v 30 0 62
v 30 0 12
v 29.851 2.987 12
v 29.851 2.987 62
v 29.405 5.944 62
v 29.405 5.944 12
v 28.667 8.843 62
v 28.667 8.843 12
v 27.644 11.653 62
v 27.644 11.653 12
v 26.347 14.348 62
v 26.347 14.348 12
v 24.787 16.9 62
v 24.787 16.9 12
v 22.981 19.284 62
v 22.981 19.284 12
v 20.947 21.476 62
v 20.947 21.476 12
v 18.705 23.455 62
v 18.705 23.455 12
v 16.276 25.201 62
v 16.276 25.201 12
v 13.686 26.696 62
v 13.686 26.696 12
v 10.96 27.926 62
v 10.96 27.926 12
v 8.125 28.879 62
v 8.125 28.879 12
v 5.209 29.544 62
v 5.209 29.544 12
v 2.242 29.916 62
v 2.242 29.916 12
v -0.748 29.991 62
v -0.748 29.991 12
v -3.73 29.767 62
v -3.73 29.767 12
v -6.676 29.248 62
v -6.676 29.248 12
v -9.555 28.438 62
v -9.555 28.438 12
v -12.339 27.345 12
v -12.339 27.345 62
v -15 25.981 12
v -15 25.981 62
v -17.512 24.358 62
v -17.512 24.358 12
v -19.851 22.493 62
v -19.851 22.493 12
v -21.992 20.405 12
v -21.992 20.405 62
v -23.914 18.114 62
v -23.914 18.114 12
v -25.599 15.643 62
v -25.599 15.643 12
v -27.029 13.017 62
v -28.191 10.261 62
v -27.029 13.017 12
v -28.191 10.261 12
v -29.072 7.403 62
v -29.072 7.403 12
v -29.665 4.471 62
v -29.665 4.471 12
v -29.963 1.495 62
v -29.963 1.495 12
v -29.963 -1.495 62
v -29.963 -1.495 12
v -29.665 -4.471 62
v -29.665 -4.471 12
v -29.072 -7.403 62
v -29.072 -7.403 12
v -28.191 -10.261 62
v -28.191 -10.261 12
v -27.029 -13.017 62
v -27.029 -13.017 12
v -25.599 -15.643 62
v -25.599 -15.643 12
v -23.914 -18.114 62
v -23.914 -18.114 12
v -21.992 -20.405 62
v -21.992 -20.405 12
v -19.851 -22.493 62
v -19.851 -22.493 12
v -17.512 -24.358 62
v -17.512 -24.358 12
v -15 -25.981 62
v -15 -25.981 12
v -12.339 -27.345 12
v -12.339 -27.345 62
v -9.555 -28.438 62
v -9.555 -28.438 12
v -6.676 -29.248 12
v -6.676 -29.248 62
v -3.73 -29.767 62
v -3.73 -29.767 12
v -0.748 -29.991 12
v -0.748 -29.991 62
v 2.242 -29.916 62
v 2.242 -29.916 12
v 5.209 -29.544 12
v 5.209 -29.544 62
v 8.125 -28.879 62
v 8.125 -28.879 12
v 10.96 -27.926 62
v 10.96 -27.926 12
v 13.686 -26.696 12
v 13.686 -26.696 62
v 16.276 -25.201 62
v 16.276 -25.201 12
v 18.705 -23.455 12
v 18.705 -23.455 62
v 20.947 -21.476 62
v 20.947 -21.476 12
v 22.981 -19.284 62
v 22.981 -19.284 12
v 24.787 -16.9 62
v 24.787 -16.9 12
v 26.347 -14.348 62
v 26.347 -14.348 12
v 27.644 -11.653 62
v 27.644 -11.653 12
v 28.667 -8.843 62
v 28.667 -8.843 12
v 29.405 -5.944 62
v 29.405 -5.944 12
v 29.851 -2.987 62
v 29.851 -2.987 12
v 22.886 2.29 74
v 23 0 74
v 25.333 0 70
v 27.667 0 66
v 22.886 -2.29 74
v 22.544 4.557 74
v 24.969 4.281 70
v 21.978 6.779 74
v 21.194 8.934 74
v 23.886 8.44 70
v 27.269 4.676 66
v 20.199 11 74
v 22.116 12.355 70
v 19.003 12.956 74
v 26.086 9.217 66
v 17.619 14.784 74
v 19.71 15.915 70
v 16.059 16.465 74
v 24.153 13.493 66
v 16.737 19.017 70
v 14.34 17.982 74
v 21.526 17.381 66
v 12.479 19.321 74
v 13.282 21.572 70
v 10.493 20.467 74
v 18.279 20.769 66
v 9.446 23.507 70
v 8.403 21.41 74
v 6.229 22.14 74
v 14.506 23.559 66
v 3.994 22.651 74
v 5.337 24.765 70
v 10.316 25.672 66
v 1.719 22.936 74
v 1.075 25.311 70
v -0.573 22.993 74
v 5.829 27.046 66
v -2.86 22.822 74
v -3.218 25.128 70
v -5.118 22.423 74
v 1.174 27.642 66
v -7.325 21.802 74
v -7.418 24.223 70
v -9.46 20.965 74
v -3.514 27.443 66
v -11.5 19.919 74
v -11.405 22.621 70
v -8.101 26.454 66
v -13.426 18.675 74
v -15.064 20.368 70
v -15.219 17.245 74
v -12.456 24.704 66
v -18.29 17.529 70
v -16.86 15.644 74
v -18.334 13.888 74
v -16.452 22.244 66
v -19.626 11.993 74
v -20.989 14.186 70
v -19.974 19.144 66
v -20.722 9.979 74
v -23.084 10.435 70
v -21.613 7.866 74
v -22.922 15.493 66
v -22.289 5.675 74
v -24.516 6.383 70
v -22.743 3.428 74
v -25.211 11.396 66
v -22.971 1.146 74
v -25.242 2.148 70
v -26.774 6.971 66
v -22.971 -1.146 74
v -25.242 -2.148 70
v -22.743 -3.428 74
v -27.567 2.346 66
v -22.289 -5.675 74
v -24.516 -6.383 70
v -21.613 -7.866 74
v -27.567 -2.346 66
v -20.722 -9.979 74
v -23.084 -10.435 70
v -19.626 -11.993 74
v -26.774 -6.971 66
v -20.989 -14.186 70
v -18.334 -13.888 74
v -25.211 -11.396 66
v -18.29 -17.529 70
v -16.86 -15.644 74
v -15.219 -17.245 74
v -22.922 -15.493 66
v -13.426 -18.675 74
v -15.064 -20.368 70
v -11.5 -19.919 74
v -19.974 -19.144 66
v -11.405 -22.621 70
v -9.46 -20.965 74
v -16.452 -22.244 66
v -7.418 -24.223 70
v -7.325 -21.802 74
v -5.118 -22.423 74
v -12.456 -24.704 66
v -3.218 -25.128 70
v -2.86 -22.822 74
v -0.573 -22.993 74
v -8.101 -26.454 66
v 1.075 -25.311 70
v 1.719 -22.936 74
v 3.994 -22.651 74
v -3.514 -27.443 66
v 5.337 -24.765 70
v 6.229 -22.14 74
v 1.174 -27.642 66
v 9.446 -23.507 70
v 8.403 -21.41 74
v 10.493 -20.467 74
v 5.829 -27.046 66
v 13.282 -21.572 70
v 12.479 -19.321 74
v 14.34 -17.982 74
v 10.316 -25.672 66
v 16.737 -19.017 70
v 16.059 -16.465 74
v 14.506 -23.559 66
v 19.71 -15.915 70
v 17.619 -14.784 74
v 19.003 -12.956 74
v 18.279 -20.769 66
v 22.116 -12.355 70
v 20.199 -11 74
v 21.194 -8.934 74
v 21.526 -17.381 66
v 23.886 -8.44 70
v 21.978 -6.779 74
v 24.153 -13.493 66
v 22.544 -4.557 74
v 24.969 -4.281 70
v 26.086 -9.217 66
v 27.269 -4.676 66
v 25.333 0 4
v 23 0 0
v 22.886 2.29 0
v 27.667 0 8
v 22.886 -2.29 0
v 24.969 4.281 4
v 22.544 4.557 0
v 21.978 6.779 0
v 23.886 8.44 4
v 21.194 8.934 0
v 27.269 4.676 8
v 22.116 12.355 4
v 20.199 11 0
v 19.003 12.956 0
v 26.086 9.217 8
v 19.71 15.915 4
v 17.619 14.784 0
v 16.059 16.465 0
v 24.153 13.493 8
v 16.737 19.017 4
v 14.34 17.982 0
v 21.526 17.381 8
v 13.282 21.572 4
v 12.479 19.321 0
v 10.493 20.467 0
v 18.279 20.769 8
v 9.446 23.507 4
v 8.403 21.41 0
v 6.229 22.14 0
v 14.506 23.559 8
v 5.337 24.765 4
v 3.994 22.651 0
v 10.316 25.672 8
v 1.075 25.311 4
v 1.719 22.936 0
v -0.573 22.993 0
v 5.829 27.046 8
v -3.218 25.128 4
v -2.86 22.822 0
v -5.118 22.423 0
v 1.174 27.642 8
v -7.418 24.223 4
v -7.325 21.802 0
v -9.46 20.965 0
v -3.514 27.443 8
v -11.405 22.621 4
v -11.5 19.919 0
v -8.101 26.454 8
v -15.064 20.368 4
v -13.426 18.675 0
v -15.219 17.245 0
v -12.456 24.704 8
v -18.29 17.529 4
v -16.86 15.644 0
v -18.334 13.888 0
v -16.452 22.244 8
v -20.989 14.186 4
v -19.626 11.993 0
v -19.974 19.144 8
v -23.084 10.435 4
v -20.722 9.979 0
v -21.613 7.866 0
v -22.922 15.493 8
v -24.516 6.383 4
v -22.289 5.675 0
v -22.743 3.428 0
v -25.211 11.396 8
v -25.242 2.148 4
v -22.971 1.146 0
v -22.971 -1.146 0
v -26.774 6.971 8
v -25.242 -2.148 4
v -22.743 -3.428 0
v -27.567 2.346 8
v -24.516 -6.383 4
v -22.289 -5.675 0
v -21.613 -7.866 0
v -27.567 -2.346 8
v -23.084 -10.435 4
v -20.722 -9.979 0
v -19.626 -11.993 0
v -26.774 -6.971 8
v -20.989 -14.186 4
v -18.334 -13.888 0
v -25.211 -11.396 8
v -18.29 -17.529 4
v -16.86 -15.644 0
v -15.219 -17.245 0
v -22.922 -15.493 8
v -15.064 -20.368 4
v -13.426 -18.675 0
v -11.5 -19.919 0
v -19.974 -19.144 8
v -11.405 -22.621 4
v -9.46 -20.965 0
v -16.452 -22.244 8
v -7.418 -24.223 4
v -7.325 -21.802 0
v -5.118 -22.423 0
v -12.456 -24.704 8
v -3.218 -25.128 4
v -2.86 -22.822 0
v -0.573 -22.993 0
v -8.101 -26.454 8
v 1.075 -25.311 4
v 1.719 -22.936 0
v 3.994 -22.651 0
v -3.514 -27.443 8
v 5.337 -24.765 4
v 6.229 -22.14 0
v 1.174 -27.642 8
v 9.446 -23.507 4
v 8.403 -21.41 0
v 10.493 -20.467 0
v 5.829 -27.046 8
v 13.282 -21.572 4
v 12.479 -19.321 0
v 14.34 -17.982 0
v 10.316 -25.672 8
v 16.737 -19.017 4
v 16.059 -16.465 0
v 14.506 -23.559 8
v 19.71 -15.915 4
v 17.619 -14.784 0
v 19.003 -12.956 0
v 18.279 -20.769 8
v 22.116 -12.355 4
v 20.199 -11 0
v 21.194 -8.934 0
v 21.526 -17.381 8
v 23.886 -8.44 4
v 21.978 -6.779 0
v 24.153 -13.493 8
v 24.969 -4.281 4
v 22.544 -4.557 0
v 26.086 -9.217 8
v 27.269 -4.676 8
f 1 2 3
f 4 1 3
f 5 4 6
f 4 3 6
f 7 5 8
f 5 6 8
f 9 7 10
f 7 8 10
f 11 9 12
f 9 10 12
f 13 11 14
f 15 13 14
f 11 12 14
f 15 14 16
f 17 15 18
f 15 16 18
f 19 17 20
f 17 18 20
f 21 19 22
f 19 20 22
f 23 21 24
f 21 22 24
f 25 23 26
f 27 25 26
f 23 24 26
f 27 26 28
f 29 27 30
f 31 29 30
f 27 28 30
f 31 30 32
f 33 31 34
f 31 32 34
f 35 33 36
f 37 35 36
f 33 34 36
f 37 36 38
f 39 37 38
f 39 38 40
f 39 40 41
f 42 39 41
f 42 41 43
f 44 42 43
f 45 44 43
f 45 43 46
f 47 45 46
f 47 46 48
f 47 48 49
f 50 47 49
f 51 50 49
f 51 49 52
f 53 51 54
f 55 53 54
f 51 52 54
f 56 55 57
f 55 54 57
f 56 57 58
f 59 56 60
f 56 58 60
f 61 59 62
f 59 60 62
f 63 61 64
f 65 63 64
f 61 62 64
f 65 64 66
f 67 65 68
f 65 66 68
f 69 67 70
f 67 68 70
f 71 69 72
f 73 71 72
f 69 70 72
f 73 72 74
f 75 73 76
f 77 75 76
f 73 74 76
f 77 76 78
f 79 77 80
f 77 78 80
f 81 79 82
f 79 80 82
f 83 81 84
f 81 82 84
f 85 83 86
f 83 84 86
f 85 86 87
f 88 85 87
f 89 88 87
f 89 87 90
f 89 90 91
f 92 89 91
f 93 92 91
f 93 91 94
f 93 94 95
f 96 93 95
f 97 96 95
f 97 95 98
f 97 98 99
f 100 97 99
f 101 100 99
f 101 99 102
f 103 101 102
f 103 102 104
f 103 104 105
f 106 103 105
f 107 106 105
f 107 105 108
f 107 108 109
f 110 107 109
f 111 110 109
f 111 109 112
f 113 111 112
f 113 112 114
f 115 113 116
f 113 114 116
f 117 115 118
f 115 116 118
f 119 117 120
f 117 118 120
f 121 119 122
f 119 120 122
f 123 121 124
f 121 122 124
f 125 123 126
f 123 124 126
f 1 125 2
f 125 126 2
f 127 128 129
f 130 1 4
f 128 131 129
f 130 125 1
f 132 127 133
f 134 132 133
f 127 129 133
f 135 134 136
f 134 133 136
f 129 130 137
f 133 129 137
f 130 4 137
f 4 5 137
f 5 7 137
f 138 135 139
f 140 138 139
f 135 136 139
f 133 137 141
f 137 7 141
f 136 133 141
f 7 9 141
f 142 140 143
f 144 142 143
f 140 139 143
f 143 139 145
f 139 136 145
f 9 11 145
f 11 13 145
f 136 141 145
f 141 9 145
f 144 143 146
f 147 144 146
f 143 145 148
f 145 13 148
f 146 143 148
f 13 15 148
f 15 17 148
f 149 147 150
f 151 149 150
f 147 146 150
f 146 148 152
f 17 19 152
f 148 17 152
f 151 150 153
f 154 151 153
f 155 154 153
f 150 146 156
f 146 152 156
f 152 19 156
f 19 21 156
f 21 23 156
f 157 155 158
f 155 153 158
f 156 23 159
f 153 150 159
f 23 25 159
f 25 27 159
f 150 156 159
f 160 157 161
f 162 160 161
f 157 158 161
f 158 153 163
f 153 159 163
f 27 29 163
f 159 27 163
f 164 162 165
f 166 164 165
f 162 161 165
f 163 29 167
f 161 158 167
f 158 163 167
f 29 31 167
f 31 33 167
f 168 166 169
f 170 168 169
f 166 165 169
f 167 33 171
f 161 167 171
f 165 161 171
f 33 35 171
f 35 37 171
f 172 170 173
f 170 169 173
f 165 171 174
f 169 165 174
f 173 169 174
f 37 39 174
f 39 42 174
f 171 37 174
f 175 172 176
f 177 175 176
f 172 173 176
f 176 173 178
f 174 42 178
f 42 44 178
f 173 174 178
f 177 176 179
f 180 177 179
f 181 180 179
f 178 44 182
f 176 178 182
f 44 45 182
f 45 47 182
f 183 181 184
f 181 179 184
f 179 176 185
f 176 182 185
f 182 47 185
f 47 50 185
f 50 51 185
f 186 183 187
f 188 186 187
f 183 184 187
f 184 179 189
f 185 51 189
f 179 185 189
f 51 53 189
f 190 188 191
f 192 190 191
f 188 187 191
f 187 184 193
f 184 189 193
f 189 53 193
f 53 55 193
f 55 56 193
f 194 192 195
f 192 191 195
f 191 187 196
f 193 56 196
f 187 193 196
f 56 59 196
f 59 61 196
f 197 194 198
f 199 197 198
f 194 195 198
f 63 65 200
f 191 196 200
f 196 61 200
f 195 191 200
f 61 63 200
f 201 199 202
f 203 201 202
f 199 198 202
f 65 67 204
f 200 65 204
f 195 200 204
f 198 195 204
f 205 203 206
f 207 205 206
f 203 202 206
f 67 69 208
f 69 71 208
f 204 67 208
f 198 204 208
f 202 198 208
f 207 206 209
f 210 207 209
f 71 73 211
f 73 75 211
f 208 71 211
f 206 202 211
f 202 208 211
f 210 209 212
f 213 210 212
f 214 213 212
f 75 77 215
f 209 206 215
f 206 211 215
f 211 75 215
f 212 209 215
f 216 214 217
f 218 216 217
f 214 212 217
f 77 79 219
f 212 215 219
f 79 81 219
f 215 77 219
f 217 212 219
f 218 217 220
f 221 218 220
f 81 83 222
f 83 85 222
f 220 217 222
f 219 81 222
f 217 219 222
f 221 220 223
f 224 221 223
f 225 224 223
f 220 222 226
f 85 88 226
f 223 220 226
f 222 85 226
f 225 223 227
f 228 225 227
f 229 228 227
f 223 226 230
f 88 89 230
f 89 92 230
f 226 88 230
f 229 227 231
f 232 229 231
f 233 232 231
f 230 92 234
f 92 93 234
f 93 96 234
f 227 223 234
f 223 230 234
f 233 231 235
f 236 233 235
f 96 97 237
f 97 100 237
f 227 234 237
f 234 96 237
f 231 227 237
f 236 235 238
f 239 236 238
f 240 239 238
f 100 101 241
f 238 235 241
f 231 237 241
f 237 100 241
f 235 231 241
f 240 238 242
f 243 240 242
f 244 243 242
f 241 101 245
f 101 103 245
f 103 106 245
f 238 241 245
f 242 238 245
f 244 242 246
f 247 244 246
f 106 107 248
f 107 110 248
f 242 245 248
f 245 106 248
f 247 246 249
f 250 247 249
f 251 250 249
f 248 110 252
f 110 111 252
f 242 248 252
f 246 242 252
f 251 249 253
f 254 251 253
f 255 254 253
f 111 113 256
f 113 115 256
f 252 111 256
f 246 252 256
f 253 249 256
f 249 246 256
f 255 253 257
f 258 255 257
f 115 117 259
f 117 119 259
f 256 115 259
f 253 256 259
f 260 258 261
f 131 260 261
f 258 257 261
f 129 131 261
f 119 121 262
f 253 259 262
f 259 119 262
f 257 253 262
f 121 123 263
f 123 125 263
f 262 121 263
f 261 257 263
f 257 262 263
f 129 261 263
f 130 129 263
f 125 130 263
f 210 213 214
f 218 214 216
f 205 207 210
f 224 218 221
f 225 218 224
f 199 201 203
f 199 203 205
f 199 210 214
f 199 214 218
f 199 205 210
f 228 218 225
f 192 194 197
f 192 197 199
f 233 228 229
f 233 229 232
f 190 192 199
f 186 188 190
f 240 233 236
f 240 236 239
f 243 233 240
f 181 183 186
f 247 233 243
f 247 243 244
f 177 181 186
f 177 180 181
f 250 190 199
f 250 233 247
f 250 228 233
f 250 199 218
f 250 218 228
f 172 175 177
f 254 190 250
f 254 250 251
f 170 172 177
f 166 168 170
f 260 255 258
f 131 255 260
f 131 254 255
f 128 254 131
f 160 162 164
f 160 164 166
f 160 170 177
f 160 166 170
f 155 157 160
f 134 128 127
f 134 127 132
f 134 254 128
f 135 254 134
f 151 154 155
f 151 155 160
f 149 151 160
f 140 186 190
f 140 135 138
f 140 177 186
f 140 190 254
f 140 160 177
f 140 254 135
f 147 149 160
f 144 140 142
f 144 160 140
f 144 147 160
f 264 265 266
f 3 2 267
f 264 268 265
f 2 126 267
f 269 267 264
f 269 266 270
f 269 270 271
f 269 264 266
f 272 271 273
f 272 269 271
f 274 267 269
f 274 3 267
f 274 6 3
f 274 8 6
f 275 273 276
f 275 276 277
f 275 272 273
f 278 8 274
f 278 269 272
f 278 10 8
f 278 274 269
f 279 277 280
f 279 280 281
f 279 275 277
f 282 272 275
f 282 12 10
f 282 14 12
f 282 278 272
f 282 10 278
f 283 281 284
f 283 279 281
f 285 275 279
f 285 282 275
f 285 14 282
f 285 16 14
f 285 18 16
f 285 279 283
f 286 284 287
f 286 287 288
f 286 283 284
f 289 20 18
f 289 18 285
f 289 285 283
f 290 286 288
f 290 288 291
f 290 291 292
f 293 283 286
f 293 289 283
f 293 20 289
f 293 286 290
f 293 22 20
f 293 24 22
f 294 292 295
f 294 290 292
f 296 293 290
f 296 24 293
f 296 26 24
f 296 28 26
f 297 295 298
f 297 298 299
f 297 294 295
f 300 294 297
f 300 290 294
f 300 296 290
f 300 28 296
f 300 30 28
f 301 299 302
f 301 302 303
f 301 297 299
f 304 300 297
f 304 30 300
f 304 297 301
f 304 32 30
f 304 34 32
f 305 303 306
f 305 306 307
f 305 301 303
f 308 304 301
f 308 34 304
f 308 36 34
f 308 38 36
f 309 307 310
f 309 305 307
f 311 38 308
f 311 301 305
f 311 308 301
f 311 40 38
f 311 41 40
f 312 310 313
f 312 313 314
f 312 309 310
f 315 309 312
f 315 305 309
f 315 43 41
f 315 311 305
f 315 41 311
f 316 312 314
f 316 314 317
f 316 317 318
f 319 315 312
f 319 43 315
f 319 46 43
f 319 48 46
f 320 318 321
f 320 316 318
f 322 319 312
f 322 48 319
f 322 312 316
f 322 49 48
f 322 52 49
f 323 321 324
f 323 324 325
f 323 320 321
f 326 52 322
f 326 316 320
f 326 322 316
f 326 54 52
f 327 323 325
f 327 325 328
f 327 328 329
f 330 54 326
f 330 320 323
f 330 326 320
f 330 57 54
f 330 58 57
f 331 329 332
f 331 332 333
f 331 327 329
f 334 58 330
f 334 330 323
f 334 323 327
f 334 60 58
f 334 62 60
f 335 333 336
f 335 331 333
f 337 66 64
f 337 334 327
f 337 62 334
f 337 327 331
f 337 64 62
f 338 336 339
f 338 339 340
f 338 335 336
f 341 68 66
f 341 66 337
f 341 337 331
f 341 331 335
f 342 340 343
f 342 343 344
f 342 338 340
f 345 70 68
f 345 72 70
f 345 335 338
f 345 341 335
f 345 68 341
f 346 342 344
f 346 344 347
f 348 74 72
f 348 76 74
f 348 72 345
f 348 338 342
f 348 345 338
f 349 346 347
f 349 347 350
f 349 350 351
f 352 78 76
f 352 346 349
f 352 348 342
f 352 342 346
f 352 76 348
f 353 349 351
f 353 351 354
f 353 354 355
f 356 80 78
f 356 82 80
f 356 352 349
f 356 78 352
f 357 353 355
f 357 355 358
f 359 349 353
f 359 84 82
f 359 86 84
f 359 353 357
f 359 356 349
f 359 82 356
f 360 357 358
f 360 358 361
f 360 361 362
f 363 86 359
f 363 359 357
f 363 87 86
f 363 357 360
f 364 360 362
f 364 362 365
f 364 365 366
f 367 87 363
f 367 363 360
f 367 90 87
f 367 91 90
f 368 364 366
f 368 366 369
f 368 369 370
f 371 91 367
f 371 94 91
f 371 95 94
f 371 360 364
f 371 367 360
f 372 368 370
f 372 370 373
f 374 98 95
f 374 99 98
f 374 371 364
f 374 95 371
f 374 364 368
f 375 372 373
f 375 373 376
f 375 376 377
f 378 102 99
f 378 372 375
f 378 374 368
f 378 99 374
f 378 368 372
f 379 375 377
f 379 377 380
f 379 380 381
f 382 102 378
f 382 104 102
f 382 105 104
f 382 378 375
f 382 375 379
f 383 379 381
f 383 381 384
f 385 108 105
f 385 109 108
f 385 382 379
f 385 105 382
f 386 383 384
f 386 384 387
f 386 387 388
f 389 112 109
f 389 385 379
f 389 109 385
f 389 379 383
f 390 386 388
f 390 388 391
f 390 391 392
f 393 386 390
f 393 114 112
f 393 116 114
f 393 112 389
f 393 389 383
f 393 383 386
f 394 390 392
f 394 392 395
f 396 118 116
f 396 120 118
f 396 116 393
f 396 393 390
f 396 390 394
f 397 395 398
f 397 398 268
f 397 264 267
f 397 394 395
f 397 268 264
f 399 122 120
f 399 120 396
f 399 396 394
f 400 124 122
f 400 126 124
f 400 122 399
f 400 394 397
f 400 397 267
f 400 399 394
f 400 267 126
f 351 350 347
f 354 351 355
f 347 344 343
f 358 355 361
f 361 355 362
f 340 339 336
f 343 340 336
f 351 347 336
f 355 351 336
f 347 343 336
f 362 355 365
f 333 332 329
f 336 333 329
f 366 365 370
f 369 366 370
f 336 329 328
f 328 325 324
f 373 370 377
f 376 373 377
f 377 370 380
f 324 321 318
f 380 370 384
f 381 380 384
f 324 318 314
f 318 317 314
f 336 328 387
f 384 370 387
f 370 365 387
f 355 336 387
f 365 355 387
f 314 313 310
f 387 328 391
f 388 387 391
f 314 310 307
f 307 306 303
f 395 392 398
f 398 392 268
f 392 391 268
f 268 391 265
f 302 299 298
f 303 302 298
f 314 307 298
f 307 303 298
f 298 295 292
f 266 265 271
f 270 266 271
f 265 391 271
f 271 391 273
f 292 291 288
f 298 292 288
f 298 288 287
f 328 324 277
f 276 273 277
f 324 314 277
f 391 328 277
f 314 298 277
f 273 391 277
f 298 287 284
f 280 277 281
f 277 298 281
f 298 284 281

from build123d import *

# Parameters (mm, degrees)
F0_R       = 30
F0_R_2     = 23
F1_DEPTH   = 74
F2_SIZE2   = 12
F2_SIZE    = 7
F2_2_SIZE2 = 12
F2_2_SIZE  = 7


with BuildPart() as f1:
    # F0 (on Top) → F1 (new body)
    with BuildSketch(Plane.XY):
        Circle(F0_R)
        Circle(F0_R_2, mode=Mode.SUBTRACT)
        Circle(F0_R_2)
    extrude(amount=F1_DEPTH)

    # F2
    f2_edges = [f1.edges().sort_by_distance(p)[0] for p in [
        (-30, 0, 74),
    ]]
    f2_side = f1.faces().sort_by_distance((0, 0, 74))[0]
    chamfer(f2_edges, length=F2_SIZE, length2=F2_SIZE2, reference=f2_side)

    # F2#2
    f2_2_edges = [f1.edges().sort_by_distance(p)[0] for p in [
        (-30, 0, 0),
    ]]
    f2_2_side = f1.faces().sort_by_distance((0, 0, 0))[0]
    chamfer(f2_2_edges, length=F2_2_SIZE, length2=F2_2_SIZE2, reference=f2_2_side)


solid = f1.part
